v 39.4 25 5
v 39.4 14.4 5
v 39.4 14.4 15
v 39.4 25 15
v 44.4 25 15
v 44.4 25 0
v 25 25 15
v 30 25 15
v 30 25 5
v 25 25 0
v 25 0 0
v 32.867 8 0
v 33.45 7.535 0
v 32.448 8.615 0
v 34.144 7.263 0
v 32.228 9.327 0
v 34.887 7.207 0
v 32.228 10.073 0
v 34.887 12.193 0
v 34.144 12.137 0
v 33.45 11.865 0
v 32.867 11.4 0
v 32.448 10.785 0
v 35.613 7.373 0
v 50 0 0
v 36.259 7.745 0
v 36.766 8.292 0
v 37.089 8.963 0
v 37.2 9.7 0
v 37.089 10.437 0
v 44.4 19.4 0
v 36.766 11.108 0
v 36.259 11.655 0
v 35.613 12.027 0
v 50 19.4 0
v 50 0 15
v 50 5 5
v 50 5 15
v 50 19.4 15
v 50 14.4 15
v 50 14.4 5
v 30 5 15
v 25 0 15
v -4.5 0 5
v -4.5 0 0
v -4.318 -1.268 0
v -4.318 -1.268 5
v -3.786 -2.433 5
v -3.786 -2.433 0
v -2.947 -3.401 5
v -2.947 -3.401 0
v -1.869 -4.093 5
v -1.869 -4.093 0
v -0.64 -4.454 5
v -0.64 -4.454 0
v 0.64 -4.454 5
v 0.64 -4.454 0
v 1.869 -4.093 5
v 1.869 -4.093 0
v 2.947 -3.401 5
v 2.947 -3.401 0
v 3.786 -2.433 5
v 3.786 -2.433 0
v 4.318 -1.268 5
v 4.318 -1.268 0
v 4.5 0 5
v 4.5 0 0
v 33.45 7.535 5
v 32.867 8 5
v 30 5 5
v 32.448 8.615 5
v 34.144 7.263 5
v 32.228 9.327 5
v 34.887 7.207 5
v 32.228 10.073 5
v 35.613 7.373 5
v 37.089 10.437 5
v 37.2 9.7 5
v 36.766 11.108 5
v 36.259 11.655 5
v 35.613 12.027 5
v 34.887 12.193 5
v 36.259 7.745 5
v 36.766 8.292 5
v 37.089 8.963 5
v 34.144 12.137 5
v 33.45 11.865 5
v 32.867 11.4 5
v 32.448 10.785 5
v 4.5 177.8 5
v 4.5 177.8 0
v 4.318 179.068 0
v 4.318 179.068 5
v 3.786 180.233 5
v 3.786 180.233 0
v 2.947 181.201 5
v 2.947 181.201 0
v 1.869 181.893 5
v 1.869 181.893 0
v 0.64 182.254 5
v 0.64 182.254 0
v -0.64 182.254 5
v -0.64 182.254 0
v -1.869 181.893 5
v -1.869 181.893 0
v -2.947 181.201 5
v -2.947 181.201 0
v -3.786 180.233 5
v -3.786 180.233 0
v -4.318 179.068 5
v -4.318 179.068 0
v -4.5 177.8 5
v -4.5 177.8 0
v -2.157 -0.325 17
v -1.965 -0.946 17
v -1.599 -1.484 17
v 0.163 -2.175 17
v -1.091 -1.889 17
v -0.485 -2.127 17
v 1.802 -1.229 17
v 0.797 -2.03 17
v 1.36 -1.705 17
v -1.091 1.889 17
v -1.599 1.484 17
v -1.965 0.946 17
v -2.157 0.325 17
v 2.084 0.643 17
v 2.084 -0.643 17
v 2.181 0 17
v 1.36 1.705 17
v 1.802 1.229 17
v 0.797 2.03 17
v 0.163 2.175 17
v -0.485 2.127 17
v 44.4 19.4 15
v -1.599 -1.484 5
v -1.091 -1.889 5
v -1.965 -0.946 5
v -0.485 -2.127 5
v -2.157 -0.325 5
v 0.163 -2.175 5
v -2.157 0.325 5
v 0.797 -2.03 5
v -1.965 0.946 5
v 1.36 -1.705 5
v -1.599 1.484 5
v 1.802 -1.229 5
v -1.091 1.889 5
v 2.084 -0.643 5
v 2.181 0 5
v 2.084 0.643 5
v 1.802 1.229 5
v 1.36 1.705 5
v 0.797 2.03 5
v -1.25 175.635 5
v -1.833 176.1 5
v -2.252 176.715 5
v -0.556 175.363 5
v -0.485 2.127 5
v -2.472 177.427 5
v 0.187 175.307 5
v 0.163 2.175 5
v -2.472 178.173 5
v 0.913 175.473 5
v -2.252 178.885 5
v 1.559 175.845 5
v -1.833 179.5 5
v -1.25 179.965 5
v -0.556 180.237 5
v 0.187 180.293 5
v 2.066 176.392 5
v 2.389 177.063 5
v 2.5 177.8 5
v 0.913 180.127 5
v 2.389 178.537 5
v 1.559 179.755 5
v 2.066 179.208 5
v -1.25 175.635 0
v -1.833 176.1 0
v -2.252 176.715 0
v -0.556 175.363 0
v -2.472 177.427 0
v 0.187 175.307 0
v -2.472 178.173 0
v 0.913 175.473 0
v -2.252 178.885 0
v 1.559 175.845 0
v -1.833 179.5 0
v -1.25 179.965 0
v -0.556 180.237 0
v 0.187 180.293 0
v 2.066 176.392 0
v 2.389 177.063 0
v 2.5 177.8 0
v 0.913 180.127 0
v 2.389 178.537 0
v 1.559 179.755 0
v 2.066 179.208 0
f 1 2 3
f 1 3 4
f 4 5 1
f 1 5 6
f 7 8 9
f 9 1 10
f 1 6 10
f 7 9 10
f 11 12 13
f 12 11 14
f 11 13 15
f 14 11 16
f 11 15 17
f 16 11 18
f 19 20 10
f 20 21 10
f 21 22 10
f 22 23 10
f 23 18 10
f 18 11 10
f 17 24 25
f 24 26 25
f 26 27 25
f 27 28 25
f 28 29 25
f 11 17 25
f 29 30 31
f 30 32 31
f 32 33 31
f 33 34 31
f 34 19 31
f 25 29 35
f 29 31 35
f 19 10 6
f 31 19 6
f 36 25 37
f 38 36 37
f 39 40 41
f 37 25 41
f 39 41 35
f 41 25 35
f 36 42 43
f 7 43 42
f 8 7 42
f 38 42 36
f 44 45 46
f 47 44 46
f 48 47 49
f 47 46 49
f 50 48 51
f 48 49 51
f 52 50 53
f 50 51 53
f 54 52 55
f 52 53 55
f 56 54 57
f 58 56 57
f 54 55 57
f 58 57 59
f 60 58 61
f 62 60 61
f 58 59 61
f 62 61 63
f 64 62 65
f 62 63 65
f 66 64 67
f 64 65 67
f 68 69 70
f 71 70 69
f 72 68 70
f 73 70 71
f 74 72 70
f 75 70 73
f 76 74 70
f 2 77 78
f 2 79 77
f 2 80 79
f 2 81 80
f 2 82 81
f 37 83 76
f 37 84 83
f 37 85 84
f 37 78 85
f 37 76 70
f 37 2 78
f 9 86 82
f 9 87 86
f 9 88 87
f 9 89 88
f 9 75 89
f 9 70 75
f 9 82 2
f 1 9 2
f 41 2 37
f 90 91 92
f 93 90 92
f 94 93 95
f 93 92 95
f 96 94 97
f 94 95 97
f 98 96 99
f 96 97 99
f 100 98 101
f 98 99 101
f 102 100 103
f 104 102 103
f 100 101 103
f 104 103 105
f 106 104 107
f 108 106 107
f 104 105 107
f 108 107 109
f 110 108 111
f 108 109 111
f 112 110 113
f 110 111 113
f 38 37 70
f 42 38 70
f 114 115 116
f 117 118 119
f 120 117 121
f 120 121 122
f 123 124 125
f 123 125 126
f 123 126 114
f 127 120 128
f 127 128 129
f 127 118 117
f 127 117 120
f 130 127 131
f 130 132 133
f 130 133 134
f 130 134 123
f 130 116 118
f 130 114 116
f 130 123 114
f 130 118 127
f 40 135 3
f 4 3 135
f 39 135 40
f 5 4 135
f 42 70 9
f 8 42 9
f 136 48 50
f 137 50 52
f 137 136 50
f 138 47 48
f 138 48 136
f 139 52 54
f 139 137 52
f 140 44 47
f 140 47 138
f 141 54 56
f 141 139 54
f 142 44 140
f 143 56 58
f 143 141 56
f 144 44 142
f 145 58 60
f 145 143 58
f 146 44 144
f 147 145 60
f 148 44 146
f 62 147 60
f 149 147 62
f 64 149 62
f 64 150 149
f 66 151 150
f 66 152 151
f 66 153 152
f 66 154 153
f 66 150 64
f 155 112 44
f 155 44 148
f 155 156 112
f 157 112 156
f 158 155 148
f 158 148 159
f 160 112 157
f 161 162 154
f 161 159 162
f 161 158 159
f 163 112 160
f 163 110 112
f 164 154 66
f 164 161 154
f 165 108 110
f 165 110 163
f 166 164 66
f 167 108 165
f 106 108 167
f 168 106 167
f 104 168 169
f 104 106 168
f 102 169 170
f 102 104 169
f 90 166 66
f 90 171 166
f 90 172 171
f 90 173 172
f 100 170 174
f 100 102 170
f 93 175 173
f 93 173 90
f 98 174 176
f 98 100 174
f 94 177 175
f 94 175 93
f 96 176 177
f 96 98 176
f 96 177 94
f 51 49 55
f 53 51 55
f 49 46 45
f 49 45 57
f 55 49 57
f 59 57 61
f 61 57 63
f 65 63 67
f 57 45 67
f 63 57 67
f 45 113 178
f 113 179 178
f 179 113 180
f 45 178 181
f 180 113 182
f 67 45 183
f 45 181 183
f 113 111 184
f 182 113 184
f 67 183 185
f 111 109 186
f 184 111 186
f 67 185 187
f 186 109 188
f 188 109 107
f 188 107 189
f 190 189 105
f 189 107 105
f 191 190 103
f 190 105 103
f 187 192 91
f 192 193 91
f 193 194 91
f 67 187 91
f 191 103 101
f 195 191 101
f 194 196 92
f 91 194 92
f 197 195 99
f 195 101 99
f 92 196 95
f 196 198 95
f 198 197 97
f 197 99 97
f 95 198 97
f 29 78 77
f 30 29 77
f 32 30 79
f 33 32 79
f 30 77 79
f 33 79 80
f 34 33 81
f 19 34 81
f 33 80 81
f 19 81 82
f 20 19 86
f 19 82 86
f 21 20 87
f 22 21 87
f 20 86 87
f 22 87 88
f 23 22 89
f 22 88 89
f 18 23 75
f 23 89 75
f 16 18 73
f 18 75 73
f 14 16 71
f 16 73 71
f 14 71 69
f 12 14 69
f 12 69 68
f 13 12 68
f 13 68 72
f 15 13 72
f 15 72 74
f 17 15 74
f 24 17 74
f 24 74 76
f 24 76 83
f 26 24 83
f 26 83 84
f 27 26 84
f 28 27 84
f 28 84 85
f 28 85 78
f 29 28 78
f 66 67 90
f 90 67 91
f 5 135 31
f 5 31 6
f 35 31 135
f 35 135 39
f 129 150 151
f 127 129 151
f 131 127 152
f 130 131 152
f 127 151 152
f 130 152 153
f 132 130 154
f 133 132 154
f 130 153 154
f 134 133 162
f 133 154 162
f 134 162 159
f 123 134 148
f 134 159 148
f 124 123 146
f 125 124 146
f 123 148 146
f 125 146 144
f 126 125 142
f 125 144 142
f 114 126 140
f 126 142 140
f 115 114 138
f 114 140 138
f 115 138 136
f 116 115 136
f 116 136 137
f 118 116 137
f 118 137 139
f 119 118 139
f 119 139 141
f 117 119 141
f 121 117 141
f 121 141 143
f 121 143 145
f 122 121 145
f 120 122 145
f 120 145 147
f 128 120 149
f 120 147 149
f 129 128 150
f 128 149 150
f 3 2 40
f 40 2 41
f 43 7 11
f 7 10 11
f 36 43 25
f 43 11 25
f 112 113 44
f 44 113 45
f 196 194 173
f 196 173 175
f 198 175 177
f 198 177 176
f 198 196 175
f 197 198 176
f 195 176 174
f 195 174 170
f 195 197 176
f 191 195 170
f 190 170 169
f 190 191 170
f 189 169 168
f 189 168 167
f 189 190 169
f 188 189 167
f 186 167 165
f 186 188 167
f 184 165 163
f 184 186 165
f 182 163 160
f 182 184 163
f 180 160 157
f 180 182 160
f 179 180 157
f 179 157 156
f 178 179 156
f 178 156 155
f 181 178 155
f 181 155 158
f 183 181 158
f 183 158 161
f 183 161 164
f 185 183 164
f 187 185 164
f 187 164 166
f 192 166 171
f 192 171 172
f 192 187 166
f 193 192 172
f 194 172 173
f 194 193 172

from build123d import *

# Parameters (mm, degrees)
F0_R      = 2.5
F1_DEPTH  = 5
F2_R      = 2.18125
F3_DEPTH  = 12
F4_W      = 25
F4_H      = 25
F5_DEPTH  = 5
F6_W      = 10.6
F6_H      = 10.6
F7_DEPTH  = 10
F8_R      = 2.5
F9_DEPTH  = 25
F10_W     = 5.6
F10_H     = 5.6
F11_DEPTH = 25


with BuildPart() as f1:
    # F0 (on Top) → F1 (new body)
    with BuildSketch(Plane.XY):
        with BuildLine():
            ThreePointArc((4.5, 177.8), (0, 182.3), (-4.5, 177.8))
            Line((-4.5, 177.8), (-4.5, 0))
            ThreePointArc((-4.5, 0), (0, -4.5), (4.5, 0))
            Line((4.5, 0), (4.5, 177.8))
        make_face()
        with Locations((0, 177.8)):
            Circle(F0_R, mode=Mode.SUBTRACT)
    extrude(amount=F1_DEPTH)

    # F2 (on face) → F3 (join)
    with BuildSketch(Plane.XY.offset(5)):
        Circle(F2_R)
    extrude(amount=F3_DEPTH)


with BuildPart() as f5:
    # F4 (on Top) → F5 (new body)
    with BuildSketch(Plane.XY):
        with Locations((37.5, 12.5)):
            Rectangle(F4_W, F4_H)
    extrude(amount=F5_DEPTH)

    # F6 (on face) → F7 (join)
    with BuildSketch(Plane.XY.offset(5)):
        Polygon((30, 25), (25, 25), (25, 0), (50, 0), (50, 5), (30, 5), align=None)
        with Locations((44.7, 19.7)):
            Rectangle(F6_W, F6_H)
    extrude(amount=F7_DEPTH)

    # F8 (on face) → F9 (cut)
    with BuildSketch(Plane.XY.offset(5)):
        with Locations((34.7, 9.7)):
            Circle(F8_R)
    extrude(amount=-F9_DEPTH, mode=Mode.SUBTRACT)

    # F10 (on face) → F11 (cut)
    with BuildSketch(Plane.XY.offset(15)):
        with Locations((47.2, 22.2)):
            Rectangle(F10_W, F10_H)
    extrude(amount=-F11_DEPTH, mode=Mode.SUBTRACT)


solid = Compound([f1.part, f5.part])
